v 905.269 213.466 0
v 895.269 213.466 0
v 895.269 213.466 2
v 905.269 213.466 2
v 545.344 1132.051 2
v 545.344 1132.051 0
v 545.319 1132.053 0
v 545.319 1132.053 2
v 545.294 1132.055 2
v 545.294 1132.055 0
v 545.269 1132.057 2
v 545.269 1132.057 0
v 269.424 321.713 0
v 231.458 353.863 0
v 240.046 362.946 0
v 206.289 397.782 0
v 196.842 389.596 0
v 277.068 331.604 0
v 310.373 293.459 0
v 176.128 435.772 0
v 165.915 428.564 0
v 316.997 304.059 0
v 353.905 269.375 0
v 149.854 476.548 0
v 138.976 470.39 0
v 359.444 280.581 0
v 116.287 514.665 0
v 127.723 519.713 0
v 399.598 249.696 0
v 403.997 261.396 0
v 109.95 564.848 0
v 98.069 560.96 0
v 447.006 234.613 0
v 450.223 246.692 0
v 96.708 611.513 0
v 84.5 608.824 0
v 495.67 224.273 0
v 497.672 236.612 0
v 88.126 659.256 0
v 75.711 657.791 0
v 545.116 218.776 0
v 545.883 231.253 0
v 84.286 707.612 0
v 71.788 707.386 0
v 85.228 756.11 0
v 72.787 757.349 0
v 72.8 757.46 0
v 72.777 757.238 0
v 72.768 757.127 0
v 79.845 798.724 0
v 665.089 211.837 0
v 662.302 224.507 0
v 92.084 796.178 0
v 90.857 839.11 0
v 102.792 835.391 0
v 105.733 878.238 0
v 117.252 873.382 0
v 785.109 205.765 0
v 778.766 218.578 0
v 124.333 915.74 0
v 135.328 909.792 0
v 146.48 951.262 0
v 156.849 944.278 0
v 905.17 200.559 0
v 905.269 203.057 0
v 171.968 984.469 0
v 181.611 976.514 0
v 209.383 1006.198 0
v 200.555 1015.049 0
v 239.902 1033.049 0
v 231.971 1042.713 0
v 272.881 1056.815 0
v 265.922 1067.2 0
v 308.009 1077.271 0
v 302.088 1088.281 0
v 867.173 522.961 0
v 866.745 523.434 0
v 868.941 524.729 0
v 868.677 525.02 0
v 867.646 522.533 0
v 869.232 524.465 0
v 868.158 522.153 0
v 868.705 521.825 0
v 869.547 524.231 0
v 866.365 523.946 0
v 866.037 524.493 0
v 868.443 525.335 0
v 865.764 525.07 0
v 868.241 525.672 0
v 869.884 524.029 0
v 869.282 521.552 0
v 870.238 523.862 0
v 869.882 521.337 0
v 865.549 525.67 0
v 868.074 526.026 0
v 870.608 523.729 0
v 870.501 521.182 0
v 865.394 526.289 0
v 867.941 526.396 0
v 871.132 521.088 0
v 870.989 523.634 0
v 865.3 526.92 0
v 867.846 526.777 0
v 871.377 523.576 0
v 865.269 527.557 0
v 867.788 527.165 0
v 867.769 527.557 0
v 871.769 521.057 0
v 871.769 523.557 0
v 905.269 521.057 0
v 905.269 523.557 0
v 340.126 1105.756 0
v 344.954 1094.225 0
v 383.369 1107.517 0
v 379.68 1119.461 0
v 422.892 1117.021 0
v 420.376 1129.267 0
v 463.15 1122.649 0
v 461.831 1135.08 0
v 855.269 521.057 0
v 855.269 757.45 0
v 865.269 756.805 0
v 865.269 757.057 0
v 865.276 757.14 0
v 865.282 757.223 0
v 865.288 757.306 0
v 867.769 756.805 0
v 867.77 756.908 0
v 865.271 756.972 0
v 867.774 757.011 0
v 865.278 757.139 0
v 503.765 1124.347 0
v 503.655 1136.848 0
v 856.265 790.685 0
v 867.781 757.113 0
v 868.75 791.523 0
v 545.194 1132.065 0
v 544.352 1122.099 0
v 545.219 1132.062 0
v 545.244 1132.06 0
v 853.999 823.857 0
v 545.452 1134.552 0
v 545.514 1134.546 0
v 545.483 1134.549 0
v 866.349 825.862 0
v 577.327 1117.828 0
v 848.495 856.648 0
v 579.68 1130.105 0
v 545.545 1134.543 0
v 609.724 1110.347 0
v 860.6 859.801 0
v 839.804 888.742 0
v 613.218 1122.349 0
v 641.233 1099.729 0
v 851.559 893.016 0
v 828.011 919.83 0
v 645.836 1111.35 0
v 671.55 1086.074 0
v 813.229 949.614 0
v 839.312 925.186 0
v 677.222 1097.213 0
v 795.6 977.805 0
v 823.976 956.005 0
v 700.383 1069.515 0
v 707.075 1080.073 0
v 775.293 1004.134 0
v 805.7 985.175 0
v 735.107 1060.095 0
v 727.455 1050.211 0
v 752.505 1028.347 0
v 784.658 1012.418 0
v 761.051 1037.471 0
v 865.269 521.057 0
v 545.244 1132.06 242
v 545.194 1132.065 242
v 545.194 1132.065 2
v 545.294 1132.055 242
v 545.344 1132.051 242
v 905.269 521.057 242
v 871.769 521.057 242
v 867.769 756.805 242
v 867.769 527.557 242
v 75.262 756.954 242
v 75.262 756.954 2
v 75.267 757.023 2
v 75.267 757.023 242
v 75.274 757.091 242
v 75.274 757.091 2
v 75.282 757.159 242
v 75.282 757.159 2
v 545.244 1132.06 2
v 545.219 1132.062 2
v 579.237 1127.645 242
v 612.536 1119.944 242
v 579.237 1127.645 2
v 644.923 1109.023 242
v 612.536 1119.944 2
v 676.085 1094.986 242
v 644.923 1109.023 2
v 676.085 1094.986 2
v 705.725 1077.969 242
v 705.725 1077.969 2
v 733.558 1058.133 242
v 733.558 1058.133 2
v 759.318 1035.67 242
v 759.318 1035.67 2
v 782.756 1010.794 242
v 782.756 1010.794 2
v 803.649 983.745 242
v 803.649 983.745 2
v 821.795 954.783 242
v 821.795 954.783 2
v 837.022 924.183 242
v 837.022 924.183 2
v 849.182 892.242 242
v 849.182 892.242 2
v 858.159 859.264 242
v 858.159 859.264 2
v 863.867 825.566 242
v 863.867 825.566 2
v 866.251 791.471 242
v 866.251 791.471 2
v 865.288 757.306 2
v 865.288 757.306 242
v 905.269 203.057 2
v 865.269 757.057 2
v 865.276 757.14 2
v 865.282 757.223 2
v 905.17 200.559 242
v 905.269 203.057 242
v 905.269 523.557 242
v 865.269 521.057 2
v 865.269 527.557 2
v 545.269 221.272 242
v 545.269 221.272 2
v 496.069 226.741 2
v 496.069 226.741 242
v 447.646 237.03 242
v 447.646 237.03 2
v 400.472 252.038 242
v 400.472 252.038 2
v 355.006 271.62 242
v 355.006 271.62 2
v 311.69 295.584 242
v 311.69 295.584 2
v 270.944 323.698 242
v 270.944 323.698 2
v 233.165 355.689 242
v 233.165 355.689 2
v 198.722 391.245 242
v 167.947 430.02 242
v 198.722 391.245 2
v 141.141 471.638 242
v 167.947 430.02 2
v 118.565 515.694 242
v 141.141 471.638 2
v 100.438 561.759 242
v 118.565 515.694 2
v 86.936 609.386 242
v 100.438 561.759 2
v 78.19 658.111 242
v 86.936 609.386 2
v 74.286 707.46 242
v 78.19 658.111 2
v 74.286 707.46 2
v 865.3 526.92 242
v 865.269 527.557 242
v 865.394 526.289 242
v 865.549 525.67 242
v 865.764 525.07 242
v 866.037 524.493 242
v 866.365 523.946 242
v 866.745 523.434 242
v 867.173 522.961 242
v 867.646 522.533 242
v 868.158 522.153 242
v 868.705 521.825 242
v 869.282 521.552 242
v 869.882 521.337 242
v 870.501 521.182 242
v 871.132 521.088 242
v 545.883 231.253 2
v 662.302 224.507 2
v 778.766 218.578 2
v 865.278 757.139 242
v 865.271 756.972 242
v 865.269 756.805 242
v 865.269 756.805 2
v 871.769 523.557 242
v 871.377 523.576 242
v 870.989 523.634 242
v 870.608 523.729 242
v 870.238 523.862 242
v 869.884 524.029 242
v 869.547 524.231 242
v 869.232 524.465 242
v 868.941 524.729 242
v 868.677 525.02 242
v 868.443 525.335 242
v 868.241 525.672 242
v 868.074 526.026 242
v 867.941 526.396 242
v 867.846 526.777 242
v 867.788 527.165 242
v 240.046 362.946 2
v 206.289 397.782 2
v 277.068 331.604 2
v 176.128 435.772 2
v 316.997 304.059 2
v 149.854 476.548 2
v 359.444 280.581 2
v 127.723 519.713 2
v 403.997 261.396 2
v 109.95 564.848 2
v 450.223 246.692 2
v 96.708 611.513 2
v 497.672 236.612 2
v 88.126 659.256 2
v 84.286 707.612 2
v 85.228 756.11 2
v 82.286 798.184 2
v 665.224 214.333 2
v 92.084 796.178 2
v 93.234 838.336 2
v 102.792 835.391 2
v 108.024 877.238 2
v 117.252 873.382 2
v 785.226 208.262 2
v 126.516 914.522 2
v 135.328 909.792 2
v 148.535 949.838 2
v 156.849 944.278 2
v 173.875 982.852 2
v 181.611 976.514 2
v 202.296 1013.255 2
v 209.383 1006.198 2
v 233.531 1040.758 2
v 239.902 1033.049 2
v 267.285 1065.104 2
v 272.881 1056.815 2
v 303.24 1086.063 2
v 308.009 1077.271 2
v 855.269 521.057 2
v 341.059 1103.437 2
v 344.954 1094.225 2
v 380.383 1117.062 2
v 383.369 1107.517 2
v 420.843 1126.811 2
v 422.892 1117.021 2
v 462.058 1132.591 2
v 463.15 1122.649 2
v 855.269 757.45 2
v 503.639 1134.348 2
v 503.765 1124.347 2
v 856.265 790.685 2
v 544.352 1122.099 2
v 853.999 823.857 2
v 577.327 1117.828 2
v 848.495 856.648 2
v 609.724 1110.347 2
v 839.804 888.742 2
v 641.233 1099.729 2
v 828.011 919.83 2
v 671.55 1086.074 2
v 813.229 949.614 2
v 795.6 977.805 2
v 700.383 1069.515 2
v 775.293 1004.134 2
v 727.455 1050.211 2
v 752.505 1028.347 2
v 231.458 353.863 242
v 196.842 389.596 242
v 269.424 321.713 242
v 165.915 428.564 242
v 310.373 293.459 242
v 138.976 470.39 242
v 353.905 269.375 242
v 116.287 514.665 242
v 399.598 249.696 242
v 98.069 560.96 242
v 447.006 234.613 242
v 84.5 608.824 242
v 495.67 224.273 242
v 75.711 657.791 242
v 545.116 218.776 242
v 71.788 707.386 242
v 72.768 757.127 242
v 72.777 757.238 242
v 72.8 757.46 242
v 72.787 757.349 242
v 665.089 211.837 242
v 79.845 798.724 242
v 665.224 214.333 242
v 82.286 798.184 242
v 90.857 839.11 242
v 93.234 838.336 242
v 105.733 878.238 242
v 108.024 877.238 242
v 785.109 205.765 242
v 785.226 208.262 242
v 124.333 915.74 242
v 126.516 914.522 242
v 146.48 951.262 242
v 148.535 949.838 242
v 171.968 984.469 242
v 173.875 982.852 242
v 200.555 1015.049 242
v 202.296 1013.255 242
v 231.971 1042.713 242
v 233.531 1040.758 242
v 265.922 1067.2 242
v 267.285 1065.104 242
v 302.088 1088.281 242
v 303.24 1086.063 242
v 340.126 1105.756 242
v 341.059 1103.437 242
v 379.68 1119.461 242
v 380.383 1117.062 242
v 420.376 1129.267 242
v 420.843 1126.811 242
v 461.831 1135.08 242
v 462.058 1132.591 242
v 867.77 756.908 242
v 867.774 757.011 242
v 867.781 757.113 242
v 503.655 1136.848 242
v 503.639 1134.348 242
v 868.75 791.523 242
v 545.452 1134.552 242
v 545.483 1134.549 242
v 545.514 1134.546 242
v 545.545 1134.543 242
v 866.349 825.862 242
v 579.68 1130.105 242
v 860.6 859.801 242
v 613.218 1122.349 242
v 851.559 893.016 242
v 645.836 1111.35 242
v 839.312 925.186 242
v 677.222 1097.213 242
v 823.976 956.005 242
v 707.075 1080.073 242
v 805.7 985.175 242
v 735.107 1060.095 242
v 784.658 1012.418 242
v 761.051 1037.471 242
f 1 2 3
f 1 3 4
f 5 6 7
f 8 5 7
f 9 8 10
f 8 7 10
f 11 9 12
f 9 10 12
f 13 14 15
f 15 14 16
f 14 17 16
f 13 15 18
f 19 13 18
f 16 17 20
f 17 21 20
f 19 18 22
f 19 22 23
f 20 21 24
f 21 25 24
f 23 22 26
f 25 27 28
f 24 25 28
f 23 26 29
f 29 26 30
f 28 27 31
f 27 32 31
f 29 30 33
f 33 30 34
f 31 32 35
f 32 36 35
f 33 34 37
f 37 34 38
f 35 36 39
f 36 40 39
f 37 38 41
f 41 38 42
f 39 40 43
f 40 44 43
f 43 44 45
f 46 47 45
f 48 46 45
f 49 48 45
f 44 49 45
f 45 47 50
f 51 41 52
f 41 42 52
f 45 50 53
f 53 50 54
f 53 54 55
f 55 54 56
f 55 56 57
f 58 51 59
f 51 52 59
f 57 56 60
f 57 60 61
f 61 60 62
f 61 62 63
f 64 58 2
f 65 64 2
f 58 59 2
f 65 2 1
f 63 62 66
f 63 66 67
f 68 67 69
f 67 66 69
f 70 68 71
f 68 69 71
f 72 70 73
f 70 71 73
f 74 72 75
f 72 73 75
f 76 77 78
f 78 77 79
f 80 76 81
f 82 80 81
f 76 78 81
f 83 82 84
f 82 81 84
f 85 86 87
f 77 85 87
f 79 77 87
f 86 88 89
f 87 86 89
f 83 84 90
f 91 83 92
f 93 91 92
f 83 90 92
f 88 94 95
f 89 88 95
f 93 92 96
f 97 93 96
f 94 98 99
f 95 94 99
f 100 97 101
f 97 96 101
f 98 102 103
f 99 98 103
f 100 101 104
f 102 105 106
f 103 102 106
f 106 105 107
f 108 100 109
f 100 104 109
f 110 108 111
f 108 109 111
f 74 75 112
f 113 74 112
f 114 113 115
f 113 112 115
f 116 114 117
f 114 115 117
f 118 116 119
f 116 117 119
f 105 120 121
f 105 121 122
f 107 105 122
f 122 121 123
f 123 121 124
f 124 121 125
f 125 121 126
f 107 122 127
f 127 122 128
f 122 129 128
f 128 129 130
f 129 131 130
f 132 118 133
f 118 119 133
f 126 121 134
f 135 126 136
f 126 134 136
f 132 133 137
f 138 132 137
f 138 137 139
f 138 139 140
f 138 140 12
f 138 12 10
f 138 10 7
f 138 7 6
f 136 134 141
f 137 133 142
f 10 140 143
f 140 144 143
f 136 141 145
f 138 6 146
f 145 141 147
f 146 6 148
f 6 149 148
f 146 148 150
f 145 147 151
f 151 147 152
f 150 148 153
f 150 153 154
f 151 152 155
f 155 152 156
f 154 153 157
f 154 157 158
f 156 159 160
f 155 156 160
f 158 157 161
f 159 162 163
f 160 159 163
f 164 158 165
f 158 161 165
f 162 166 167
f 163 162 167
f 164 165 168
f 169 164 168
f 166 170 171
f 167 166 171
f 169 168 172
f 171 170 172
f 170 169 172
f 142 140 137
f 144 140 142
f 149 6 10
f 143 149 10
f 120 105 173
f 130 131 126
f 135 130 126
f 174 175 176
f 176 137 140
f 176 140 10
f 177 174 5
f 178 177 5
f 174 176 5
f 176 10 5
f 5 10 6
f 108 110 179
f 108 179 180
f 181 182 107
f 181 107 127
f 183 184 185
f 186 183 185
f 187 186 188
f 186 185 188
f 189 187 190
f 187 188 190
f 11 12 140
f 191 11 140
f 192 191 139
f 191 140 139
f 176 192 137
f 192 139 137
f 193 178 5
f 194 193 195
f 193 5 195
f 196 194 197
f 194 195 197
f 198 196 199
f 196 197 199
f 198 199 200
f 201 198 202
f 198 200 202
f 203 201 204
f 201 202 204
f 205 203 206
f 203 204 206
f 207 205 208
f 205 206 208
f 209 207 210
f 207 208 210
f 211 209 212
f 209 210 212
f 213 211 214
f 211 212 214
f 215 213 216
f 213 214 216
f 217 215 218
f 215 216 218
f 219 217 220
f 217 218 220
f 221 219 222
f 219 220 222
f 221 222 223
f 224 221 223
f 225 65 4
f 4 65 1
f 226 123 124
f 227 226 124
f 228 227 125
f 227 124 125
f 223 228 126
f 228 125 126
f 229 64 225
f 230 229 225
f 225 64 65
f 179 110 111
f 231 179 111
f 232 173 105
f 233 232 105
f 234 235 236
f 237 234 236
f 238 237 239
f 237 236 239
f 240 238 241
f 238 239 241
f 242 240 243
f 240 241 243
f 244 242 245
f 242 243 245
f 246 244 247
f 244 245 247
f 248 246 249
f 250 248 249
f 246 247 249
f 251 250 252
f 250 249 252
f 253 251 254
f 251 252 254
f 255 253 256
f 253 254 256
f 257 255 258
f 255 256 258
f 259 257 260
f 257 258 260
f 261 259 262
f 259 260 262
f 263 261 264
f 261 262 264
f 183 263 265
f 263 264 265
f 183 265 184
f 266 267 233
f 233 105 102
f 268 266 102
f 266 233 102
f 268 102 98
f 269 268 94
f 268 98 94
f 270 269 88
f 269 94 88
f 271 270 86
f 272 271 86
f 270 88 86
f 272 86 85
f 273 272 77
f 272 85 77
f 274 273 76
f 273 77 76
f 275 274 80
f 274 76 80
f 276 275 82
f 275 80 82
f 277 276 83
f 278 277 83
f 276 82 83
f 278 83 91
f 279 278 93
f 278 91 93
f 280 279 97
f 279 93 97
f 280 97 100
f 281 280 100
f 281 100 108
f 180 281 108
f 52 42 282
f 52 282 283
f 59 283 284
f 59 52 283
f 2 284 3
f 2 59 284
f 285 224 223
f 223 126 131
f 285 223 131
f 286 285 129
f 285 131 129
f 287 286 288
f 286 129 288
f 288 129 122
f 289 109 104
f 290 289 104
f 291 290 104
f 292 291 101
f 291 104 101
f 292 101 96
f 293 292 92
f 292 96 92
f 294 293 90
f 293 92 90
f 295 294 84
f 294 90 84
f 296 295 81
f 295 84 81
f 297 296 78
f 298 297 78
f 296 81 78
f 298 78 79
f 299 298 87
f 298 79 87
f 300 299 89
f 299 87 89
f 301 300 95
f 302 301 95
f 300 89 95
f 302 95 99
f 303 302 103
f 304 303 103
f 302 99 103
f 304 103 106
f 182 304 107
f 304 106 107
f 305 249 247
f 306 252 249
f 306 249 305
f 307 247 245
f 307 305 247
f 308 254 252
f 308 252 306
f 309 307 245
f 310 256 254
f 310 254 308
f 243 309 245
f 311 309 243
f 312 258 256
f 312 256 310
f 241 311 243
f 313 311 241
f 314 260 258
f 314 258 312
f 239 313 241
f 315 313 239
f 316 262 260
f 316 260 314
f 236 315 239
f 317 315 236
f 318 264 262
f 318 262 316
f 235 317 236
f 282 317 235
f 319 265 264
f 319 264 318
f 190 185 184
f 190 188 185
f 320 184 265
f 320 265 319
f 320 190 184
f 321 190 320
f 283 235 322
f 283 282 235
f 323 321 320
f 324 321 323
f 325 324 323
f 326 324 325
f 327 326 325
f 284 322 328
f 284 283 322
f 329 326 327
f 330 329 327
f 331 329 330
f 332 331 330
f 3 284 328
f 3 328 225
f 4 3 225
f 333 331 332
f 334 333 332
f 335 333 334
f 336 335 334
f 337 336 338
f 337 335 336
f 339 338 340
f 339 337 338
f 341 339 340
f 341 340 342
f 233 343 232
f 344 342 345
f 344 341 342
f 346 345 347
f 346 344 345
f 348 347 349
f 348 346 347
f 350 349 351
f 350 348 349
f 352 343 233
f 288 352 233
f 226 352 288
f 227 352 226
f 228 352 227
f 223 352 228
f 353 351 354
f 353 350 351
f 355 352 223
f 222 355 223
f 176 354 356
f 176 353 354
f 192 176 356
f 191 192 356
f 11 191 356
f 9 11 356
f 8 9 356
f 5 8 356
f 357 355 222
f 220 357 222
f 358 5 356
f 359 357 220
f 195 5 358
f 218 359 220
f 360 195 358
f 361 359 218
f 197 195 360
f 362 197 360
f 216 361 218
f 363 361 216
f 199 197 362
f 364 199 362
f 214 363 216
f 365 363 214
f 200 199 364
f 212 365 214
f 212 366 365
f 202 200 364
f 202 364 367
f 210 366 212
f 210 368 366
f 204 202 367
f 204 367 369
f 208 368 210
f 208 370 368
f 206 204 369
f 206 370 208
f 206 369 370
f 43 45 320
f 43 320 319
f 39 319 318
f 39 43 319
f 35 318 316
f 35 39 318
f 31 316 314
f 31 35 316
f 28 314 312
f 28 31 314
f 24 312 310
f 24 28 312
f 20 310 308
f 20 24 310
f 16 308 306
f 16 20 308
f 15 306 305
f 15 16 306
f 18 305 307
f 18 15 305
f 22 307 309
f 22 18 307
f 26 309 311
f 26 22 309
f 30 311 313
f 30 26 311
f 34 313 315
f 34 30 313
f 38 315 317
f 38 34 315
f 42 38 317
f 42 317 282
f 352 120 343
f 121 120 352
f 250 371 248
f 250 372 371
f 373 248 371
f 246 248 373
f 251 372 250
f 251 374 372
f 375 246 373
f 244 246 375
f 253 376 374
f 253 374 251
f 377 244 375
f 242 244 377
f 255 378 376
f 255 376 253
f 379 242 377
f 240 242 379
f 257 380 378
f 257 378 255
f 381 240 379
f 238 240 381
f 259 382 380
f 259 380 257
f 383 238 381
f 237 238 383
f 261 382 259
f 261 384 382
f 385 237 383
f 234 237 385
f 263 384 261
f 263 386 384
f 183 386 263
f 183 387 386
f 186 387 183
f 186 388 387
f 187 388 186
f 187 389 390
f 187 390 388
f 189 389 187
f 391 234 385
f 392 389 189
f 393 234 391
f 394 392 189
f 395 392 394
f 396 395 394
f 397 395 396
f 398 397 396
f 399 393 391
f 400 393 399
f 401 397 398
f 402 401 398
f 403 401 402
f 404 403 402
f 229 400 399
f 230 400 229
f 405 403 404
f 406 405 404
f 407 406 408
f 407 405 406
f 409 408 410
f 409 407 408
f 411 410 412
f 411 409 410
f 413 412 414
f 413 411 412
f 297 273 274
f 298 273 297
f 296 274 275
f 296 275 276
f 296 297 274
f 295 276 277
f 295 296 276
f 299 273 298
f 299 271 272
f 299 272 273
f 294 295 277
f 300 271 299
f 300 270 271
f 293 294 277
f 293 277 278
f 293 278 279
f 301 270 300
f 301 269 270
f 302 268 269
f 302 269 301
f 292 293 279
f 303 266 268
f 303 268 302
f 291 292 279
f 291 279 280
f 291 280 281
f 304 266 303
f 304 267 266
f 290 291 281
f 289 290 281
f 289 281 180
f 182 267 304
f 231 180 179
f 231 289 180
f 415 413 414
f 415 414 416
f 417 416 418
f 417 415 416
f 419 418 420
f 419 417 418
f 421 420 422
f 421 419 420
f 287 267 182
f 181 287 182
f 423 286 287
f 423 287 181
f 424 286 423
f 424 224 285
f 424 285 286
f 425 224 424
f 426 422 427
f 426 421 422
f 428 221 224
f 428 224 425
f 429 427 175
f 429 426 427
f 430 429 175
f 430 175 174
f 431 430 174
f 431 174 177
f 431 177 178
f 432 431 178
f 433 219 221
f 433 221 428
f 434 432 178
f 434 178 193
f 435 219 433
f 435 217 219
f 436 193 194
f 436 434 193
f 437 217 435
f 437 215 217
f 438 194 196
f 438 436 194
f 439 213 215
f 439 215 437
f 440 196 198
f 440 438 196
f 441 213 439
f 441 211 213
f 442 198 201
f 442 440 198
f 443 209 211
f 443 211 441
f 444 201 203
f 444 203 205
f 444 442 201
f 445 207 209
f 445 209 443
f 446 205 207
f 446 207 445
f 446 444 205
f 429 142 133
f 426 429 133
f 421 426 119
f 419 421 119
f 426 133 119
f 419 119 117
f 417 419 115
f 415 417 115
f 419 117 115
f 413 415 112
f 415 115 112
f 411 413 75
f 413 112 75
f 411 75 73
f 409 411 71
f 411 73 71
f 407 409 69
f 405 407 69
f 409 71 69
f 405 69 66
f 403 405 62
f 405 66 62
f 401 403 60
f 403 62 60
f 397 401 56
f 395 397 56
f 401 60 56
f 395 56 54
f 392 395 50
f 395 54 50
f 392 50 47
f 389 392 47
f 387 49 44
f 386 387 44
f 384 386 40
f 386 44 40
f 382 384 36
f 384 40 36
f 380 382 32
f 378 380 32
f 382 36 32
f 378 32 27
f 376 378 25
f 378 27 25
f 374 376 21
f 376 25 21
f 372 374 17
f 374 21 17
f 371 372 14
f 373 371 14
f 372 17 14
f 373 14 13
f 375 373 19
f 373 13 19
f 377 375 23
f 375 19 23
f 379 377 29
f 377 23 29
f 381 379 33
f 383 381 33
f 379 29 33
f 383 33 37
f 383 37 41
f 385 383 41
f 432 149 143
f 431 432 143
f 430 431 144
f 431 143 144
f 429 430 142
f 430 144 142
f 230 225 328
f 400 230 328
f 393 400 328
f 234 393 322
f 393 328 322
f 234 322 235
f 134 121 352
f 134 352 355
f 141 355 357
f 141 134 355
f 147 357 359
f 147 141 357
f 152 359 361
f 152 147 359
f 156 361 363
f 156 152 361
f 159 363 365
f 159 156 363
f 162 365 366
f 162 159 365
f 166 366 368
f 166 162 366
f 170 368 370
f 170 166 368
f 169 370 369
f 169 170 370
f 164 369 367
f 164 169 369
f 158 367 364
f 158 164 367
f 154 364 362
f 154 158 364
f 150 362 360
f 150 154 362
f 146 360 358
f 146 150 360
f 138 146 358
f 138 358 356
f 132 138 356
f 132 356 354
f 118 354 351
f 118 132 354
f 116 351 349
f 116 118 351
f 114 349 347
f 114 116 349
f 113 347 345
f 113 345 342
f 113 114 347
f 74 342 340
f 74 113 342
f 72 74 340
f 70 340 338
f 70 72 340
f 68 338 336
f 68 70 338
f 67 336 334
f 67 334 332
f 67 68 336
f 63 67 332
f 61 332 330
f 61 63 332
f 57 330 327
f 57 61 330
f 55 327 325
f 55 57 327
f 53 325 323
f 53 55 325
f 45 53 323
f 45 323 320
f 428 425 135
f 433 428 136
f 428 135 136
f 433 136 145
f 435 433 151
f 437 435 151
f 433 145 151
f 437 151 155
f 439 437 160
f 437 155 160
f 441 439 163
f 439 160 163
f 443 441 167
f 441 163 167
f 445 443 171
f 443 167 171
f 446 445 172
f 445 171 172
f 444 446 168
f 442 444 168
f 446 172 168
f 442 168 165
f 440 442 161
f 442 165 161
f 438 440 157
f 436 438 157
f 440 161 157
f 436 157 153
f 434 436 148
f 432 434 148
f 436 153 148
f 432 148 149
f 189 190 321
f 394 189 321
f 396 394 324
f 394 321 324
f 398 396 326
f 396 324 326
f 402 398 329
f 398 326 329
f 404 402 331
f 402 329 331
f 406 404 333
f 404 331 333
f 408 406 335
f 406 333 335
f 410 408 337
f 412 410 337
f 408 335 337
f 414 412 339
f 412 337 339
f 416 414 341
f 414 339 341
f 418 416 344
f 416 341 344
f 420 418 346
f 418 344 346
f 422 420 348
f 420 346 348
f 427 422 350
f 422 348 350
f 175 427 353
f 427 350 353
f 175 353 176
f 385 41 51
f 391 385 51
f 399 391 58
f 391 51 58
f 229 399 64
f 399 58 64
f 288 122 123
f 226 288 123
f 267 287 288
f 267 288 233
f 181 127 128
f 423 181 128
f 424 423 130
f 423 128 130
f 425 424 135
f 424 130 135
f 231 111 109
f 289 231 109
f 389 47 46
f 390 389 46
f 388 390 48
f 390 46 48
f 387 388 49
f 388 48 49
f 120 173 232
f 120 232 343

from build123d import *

# Parameters (mm, degrees)
BASE_FLANGE1_DEPTH      = 242
EXTRUDE_THIN1_DEPTH     = 2
CUT_EXTRUDE3_DEPTH      = 1473.940690723
CUT_EXTRUDE3_DEPTH_BACK = 1473.940690723


# Read off the part's stored shape, not the designer's step: Base-Flange1
with BuildPart() as part:
    # Base-Flange1 outline → Base-Flange1 (new body)
    with BuildSketch(Plane.XY):
        with BuildLine():
            Line((871.769127642, 521.057153497), (905.269127642, 521.057153497))
            Line((905.269127642, 521.057153497), (905.269127642, 523.557153497))
            Line((905.269127642, 523.557153497), (871.769127642, 523.557153497))
            ThreePointArc((871.769127642, 523.557153497), (868.940700517, 524.728726372), (867.769127642, 527.557153497))
            Line((867.769127642, 527.557153497), (867.769127642, 756.805124112))
            ThreePointArc((867.769127642, 756.805124112), (867.77210353, 756.959390926), (867.781026767, 757.1134282))
            ThreePointArc((867.781026767, 757.1134282), (784.657582784, 1012.417540201), (545.544536696, 1134.54308108))
            ThreePointArc((545.544536696, 1134.54308108), (545.498432474, 1134.547059372), (545.45237736, 1134.551570763))
            ThreePointArc((545.45237736, 1134.551570763), (231.971479061, 1042.712636382), (72.799654121, 757.46012787))
            ThreePointArc((72.799654121, 757.46012787), (72.781664067, 757.29368801), (72.76796633, 757.126840052))
            ThreePointArc((72.76796633, 757.126840052), (196.842388714, 389.59572995), (545.115755529, 218.776406833))
            ThreePointArc((545.115755529, 218.776406833), (725.093462287, 208.692500871), (905.169857989, 200.559125168))
            Line((905.169857989, 200.559125168), (905.269127642, 203.057153497))
            ThreePointArc((905.269127642, 203.057153497), (725.219790585, 211.189307063), (545.269127642, 221.271697797))
            ThreePointArc((545.269127642, 221.271697797), (198.721595151, 391.244542603), (75.262011332, 756.954388532))
            ThreePointArc((75.262011332, 756.954388532), (75.270440709, 757.057064199), (75.281511511, 757.159488728))
            ThreePointArc((75.281511511, 757.159488728), (233.530616685, 1040.758387199), (545.194264845, 1132.064930876))
            ThreePointArc((545.194264845, 1132.064930876), (545.269104404, 1132.057599865), (545.344023766, 1132.051135141))
            ThreePointArc((545.344023766, 1132.051135141), (782.756272141, 1010.794266398), (865.28846372, 757.306118255))
            ThreePointArc((865.28846372, 757.306118255), (865.27396346, 757.055807685), (865.269127642, 756.805124112))
            Line((865.269127642, 756.805124112), (865.269127642, 527.557153497))
            ThreePointArc((865.269127642, 527.557153497), (867.172933564, 522.960959419), (871.769127642, 521.057153497))
        make_face()
    extrude(amount=BASE_FLANGE1_DEPTH)

    # Sketch9 → Extrude-Thin1 (add)
    with BuildSketch(Plane.XY):
        with BuildLine():
            Line((905.269127642, 203.057153497), (905.269127642, 521.057153497))
            Line((905.269127642, 521.057153497), (865.269127642, 521.057153497))
            Line((865.269127642, 521.057153497), (865.269127642, 757.057153497))
            ThreePointArc((865.269127642, 757.057153497), (782.812941082, 1010.7278743), (545.269127642, 1132.057153497))
            ThreePointArc((545.269127642, 1132.057153497), (233.519744905, 1040.749713195), (75.269127642, 757.057153497))
            ThreePointArc((75.269127642, 757.057153497), (198.687627947, 391.283260157), (545.269127642, 221.271697797))
            ThreePointArc((545.269127642, 221.271697797), (725.219790584, 211.189307063), (905.269127642, 203.057153497))
        make_face()
        with BuildLine():
            Line((895.269127642, 213.465697296), (895.269127642, 511.057153497))
            Line((895.269127642, 511.057153497), (855.269127642, 511.057153497))
            Line((855.269127642, 511.057153497), (855.269127642, 757.449526591))
            ThreePointArc((855.269127642, 757.449526591), (775.293432889, 1004.134267456), (544.352108556, 1122.098574947))
            ThreePointArc((544.352108556, 1122.098574947), (239.902349284, 1033.049195687), (85.227547592, 756.110297031))
            ThreePointArc((85.227547592, 756.110297031), (206.289423946, 397.781672568), (545.882616091, 231.252861653))
            ThreePointArc((545.882616091, 231.252861653), (720.529084068, 221.440244534), (895.269127642, 213.465697296))
        make_face(mode=Mode.SUBTRACT)
    extrude(amount=EXTRUDE_THIN1_DEPTH)

    # Sketch11 → Cut-Extrude3 (cut, two sides: drawn at the far end of the back side and taken through both)
    with BuildSketch(Plane.XY.offset(2).offset(-CUT_EXTRUDE3_DEPTH_BACK)):
        Polygon((905.269127642, 521.057153497), (895.269127642, 521.057153497), (855.269127642, 521.057153497), (855.269127642, 511.057153497), (895.269127642, 511.057153497), (895.269127642, 213.465697296), (905.269127642, 213.465697296), align=None)
    extrude(amount=CUT_EXTRUDE3_DEPTH + CUT_EXTRUDE3_DEPTH_BACK, mode=Mode.SUBTRACT)


solid = part.part
